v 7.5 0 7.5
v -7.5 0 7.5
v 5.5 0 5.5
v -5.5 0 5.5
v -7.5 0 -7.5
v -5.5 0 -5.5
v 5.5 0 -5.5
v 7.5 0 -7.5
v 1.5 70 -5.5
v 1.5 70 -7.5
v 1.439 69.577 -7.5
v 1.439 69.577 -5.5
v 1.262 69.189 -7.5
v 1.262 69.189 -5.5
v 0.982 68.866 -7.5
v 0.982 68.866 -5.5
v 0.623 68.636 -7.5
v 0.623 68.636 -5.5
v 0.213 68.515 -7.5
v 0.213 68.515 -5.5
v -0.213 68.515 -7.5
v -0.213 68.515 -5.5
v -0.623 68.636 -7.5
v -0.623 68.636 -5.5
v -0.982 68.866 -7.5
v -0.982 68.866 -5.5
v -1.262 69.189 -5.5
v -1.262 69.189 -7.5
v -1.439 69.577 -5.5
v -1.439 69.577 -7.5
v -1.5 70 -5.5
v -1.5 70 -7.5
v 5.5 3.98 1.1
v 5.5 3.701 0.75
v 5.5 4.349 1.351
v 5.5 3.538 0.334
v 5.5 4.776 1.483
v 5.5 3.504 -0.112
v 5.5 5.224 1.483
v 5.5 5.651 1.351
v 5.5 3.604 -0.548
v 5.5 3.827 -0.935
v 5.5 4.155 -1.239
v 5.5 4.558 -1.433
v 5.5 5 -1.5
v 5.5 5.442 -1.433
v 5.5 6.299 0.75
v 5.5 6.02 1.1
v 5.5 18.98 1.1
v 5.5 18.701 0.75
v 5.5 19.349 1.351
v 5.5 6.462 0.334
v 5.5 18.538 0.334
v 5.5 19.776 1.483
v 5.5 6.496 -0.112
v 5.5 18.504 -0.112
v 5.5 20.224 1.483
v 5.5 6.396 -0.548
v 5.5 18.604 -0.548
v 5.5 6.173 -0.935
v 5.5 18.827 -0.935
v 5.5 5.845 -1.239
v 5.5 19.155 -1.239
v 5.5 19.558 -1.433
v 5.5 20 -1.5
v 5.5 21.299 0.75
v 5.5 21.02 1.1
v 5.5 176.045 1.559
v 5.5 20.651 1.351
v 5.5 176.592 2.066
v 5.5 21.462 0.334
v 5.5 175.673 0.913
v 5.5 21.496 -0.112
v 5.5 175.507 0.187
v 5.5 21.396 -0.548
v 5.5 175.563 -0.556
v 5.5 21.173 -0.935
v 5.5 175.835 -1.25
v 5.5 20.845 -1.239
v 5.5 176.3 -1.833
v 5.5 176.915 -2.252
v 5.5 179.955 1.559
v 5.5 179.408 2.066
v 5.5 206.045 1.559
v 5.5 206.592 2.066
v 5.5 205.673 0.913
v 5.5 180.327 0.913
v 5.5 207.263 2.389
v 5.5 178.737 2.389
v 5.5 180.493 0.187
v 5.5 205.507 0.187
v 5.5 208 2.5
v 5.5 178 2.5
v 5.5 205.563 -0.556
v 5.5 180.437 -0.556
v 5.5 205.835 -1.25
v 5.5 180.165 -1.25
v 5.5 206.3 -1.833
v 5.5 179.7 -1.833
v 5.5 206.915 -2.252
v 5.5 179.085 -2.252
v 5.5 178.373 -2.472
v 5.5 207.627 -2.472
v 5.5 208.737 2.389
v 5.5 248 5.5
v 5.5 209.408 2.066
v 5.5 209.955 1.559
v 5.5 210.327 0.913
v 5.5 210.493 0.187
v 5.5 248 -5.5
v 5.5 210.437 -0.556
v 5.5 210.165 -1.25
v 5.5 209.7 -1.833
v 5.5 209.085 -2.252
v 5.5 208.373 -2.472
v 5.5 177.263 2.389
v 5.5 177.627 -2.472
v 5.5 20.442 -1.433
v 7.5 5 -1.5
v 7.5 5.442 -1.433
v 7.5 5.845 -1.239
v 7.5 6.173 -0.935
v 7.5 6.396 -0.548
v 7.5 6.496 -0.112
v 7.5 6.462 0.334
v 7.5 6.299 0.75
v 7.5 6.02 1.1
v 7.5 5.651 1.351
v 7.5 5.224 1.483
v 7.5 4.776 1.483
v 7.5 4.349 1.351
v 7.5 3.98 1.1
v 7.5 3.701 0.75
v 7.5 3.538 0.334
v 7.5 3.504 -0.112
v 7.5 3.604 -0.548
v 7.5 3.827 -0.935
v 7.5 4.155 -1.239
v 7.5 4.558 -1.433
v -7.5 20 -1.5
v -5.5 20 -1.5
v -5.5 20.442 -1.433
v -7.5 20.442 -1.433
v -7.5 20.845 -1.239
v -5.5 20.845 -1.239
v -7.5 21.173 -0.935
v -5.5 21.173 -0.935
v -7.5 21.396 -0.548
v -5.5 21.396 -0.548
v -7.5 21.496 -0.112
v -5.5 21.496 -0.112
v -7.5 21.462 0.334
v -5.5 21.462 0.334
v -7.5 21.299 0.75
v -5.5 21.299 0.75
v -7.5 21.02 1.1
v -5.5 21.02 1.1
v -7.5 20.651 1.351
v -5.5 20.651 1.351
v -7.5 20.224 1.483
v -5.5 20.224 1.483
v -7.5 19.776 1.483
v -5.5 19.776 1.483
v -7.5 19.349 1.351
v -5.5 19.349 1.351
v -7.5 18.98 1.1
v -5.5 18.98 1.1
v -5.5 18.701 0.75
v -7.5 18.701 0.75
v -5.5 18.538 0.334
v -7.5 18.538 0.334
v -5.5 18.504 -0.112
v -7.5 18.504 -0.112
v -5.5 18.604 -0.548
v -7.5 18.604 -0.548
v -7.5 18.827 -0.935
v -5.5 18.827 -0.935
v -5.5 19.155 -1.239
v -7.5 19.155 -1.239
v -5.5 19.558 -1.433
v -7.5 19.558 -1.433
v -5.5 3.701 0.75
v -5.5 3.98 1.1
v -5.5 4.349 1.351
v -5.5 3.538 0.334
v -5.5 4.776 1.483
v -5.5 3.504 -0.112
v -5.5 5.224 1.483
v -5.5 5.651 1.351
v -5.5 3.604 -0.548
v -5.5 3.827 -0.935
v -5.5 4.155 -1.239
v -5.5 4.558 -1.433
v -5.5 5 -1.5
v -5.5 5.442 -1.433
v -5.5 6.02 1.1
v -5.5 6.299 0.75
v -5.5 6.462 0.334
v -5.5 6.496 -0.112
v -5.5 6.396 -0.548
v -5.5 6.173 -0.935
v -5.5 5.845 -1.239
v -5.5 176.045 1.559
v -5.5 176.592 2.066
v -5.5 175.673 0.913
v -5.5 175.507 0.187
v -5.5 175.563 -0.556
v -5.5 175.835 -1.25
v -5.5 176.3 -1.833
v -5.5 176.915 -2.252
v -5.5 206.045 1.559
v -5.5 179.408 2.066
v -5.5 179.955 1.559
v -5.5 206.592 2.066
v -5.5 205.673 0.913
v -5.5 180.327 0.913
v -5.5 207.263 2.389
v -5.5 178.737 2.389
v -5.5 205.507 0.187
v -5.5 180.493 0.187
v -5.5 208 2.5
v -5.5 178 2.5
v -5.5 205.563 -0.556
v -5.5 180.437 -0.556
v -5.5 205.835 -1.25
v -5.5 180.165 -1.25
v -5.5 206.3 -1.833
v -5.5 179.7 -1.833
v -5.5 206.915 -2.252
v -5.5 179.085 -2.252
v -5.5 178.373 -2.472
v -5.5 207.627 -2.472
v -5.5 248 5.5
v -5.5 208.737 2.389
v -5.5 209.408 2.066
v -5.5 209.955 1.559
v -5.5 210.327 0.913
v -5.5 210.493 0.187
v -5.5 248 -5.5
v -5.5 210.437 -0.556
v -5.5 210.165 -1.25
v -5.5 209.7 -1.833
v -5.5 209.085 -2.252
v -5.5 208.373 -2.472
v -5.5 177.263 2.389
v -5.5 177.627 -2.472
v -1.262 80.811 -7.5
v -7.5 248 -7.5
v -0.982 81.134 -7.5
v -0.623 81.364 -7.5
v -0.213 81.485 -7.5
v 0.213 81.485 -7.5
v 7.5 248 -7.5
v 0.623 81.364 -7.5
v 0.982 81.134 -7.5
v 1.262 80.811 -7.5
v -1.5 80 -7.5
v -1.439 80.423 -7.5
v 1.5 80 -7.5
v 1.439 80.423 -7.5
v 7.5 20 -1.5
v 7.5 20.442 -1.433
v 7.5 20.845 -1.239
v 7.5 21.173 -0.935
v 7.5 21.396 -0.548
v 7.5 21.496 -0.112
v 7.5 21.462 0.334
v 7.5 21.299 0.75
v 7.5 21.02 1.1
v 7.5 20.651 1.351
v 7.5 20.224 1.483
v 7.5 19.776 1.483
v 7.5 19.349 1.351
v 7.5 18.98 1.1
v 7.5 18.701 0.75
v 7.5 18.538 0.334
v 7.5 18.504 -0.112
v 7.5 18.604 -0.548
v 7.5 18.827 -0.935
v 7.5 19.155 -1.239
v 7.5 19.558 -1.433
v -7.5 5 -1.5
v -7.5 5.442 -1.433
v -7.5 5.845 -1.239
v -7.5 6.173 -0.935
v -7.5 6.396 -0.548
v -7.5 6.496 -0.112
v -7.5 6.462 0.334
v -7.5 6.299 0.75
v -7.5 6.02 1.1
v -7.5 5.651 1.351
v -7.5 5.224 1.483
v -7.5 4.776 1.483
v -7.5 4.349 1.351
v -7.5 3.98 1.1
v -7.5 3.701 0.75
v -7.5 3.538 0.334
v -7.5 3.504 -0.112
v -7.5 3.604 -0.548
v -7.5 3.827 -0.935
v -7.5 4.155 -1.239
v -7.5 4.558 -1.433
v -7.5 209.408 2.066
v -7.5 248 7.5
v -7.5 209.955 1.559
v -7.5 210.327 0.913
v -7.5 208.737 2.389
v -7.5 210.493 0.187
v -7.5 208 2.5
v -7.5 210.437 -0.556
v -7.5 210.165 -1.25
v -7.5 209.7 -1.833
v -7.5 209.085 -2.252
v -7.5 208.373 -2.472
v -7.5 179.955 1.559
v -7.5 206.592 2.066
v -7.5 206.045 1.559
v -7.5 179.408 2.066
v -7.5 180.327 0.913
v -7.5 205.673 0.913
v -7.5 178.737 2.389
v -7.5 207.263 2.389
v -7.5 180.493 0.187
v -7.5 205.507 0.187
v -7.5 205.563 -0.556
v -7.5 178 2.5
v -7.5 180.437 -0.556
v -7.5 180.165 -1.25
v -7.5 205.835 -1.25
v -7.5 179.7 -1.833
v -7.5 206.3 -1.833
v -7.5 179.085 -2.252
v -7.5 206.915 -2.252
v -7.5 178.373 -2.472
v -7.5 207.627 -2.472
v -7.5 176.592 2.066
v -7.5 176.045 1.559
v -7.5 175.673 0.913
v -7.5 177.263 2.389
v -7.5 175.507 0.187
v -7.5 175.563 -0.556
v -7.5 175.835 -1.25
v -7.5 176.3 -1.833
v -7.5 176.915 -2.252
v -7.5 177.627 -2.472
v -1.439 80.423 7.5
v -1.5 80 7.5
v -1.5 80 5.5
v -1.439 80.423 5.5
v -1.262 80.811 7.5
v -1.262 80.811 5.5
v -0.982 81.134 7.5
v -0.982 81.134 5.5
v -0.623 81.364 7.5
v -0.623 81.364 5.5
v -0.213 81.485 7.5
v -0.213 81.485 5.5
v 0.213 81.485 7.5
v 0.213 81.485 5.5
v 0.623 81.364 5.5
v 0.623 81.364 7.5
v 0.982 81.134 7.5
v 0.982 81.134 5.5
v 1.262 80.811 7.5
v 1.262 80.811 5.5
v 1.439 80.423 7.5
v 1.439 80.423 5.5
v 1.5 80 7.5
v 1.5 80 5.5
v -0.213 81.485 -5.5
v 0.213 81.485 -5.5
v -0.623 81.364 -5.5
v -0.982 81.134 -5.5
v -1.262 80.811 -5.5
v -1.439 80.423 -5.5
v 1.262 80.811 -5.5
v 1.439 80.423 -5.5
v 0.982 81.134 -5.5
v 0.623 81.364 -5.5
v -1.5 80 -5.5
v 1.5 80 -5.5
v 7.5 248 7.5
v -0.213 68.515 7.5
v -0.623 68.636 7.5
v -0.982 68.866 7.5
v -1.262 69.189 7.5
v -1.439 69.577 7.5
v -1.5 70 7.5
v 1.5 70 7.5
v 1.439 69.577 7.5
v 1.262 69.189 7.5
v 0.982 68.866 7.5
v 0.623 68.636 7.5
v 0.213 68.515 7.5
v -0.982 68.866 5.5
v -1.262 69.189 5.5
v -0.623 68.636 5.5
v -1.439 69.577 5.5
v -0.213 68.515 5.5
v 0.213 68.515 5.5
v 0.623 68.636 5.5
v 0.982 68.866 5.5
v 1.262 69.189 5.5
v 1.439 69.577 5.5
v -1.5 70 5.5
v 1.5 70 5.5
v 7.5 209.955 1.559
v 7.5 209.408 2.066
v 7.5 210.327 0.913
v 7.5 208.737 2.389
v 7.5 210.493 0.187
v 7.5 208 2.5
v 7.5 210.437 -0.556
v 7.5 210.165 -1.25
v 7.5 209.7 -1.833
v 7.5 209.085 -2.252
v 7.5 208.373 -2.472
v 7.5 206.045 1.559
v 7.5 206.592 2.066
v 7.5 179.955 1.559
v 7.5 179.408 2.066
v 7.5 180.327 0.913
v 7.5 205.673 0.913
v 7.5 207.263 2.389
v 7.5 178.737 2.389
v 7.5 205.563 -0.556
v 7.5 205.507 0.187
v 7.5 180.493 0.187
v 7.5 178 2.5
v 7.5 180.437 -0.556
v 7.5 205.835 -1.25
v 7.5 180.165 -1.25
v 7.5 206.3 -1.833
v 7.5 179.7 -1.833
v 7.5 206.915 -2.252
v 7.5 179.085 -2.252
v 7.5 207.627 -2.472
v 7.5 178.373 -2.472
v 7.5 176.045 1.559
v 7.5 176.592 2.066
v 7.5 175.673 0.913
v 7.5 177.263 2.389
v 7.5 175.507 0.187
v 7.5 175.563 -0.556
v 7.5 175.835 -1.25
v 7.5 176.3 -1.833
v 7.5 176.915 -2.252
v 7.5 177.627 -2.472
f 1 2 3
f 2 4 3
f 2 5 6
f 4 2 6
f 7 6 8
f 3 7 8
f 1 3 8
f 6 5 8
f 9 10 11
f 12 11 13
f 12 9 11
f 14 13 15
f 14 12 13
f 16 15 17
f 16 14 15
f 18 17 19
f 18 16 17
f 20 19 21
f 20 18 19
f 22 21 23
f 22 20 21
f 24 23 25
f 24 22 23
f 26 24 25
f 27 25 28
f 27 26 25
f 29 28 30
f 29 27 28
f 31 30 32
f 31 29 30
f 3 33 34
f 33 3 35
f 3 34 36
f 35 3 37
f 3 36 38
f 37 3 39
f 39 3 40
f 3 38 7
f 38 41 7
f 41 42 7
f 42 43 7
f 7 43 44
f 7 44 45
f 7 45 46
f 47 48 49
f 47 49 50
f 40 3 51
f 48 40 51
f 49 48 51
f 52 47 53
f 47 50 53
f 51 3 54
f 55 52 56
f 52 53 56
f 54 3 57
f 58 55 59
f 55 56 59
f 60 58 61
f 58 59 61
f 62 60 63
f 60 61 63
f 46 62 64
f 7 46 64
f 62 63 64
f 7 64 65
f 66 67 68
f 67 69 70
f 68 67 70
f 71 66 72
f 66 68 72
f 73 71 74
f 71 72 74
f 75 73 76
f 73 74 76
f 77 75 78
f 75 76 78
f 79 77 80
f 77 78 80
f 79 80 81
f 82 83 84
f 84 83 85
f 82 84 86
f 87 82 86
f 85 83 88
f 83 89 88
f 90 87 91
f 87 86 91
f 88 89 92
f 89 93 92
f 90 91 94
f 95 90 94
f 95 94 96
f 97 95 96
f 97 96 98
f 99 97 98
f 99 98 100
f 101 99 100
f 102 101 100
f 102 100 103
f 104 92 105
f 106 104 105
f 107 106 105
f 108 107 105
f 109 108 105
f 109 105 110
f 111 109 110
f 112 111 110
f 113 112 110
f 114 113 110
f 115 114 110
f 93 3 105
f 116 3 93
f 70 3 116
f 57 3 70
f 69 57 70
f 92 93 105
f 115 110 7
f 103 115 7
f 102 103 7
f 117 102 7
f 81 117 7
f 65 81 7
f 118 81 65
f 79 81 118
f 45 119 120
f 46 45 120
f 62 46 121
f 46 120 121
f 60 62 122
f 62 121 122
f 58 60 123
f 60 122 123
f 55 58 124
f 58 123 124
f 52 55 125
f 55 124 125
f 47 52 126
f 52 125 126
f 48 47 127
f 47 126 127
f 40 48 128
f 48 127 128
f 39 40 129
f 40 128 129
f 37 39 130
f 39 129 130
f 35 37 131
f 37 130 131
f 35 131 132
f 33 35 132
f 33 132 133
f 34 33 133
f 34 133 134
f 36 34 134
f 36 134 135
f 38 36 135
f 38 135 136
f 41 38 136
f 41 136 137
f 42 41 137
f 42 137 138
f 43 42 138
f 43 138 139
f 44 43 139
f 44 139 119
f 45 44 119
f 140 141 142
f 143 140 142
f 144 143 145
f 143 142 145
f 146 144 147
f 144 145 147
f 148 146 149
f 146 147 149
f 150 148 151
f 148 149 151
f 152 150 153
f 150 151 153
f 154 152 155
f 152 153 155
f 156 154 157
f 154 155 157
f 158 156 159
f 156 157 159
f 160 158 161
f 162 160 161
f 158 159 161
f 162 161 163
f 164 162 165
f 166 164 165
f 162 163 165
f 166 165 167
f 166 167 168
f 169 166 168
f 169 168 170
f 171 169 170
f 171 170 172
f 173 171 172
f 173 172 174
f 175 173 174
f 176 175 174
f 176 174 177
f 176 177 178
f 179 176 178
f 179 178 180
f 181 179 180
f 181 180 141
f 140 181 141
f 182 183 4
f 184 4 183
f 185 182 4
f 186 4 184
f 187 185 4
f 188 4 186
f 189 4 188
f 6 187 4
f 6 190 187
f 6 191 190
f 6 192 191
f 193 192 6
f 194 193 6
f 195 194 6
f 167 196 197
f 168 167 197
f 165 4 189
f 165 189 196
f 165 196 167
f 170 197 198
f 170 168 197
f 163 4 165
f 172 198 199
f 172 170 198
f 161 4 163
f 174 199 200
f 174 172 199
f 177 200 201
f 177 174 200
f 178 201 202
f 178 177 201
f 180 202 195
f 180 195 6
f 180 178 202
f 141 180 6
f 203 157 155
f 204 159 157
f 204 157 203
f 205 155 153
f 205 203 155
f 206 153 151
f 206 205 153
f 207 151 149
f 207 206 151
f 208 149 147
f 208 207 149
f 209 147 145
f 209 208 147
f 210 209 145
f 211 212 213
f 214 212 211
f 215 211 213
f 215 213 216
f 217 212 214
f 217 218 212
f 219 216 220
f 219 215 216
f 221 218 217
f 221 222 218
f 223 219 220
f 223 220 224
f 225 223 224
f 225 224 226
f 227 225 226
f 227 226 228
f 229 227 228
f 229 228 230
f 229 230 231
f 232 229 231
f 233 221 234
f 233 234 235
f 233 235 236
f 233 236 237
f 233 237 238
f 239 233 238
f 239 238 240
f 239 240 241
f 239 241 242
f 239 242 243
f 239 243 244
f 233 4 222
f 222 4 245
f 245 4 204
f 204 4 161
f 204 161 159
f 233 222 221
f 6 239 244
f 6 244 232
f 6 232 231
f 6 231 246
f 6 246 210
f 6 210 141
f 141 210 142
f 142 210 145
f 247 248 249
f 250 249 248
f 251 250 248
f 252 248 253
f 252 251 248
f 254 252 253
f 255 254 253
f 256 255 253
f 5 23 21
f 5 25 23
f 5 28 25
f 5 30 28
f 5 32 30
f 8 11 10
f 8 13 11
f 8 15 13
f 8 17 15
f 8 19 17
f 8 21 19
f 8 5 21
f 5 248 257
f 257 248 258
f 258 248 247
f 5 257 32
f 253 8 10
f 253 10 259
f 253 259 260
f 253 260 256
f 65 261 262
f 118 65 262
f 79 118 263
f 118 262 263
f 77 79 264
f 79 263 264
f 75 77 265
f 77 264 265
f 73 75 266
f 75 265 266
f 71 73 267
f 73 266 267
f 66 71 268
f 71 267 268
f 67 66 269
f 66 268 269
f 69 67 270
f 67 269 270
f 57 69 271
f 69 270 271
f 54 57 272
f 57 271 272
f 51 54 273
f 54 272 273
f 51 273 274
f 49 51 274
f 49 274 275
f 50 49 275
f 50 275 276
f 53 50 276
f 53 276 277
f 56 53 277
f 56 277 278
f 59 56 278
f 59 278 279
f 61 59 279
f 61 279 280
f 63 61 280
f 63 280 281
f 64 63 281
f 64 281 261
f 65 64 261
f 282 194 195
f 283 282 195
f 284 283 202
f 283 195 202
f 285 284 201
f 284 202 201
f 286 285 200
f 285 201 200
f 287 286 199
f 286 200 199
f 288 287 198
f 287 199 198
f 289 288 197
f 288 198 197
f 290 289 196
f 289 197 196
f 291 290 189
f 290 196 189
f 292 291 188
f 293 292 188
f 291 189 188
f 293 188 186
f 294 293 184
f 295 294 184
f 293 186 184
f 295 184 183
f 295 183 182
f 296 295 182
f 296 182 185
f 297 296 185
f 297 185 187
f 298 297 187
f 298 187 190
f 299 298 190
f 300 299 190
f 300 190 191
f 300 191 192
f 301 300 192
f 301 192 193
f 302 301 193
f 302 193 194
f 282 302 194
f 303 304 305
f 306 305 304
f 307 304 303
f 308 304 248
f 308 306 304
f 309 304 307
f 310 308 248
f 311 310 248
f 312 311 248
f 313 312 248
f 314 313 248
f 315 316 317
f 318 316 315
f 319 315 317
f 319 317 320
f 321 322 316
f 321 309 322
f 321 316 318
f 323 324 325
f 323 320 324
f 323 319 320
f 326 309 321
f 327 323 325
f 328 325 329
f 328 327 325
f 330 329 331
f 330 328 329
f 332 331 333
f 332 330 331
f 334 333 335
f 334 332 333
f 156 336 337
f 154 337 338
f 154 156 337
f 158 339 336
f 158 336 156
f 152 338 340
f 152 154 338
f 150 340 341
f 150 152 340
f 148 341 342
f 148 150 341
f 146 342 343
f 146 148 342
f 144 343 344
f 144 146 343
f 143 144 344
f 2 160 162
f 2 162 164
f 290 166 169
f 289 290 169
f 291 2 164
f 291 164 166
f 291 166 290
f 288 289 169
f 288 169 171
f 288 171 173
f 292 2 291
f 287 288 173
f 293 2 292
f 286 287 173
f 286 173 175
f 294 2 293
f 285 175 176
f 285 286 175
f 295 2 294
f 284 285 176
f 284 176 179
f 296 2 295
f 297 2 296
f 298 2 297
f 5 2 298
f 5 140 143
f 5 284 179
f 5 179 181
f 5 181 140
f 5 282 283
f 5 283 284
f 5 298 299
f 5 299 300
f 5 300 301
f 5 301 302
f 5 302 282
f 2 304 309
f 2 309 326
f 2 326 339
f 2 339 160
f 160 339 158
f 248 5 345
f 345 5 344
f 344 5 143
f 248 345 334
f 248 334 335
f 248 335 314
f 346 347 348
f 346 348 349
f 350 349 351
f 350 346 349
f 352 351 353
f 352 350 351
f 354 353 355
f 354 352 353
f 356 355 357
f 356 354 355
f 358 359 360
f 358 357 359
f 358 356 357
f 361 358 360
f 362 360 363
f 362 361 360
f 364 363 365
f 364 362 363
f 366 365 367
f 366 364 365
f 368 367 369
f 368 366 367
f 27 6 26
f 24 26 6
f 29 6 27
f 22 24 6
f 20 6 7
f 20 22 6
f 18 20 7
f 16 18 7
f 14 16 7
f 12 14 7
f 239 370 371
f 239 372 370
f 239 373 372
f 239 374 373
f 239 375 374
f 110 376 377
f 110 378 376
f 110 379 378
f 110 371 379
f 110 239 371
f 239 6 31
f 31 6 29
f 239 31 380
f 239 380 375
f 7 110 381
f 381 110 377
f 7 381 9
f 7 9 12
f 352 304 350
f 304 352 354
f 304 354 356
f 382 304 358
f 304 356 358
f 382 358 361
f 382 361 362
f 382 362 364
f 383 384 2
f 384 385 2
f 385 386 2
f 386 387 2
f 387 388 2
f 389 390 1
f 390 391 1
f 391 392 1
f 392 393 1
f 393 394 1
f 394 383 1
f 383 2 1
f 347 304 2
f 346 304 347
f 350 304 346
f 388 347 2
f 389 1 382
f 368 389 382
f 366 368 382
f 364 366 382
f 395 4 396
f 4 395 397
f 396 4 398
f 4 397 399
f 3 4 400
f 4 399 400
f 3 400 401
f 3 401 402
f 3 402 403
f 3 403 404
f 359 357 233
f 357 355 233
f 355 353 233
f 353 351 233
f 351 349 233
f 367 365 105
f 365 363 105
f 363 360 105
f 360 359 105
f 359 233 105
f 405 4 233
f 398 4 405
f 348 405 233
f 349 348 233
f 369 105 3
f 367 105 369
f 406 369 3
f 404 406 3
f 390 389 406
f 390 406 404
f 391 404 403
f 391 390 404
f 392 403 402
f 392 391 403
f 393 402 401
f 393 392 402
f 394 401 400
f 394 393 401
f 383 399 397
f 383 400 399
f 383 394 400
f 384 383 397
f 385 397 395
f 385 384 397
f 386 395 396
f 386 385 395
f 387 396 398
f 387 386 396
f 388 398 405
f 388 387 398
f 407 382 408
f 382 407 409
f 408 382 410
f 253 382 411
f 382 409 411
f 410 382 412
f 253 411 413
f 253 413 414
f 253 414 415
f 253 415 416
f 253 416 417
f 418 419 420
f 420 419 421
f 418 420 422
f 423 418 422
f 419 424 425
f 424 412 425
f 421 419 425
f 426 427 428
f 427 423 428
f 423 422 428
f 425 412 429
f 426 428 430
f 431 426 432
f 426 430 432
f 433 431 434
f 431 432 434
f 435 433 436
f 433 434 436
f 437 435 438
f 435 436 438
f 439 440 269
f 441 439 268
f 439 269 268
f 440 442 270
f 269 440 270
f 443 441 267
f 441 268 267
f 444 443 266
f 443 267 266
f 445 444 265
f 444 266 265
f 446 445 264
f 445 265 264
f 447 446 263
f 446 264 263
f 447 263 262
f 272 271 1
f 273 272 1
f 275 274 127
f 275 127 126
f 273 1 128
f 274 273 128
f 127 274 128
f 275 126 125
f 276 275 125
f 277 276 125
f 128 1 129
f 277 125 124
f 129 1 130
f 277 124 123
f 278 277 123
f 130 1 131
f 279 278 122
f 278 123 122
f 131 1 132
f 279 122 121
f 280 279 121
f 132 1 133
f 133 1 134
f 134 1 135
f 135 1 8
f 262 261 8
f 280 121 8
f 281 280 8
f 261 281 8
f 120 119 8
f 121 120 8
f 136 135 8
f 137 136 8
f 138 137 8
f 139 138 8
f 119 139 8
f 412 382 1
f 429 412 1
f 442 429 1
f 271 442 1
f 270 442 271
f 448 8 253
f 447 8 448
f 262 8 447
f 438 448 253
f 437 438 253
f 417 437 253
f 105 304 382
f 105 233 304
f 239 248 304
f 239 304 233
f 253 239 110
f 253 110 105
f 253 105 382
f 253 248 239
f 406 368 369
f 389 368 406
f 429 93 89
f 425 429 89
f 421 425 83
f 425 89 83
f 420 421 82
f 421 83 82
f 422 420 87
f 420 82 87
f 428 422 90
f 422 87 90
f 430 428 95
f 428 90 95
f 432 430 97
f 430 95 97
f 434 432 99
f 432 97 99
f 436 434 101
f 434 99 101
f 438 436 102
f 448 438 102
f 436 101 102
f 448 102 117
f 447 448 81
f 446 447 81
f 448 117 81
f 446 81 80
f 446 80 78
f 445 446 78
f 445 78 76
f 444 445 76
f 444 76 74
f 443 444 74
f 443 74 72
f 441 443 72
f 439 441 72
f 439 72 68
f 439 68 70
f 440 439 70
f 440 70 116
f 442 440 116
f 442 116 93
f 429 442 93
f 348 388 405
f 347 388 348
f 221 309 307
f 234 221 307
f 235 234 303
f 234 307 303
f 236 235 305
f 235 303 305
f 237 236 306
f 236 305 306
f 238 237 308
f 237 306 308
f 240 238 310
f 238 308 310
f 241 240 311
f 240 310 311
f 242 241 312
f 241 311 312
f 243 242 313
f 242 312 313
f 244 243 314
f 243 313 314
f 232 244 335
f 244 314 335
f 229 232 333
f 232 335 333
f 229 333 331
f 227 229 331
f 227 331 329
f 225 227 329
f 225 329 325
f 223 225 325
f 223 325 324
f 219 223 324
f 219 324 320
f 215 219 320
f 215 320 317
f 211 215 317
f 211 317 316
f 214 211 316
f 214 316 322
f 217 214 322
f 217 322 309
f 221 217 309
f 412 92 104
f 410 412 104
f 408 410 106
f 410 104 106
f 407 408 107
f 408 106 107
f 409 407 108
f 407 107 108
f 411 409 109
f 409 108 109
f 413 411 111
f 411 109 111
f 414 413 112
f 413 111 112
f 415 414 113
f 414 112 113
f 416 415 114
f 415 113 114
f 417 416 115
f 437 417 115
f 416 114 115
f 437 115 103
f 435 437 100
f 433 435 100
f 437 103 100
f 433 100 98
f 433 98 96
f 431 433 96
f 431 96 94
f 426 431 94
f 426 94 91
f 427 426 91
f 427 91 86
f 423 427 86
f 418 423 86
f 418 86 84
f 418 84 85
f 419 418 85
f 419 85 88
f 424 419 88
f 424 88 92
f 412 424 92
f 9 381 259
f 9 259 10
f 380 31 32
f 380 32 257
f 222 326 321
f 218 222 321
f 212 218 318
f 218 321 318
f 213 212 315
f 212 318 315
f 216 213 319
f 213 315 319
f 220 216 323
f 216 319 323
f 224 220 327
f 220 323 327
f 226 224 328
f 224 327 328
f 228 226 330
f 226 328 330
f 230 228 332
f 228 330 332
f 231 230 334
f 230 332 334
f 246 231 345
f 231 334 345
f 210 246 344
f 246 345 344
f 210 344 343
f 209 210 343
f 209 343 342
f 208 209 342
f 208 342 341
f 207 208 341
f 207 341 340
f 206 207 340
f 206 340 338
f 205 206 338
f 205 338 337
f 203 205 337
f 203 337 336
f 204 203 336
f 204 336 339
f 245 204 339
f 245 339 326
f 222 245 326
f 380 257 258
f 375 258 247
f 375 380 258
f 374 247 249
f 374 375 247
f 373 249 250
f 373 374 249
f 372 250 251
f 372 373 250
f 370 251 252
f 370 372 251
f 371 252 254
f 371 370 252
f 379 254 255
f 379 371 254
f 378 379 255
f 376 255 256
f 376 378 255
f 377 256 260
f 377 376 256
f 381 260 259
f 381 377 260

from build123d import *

# Parameters (mm, degrees)
SKETCH_1_W          = 15
SKETCH_1_H          = 15
EXTRUDE_1_DEPTH     = 248
SKETCH_3_R          = 1.5
CUT_EXTRUDE_2_DEPTH = 15
CUT_EXTRUDE_3_DEPTH = 15
SKETCH_5_W          = 11
SKETCH_5_H          = 11
CUT_EXTRUDE_4_DEPTH = 248
SKETCH_6_R          = 2.5
CUT_EXTRUDE_5_DEPTH = 15


with BuildPart() as part:
    # 草图1 → 凸台-拉伸1 (new body)
    with BuildSketch(Plane(origin=(0, 0, 0), x_dir=(1, 0, 0), z_dir=(0, 1, 0))):
        Rectangle(SKETCH_1_W, SKETCH_1_H)
    extrude(amount=EXTRUDE_1_DEPTH)

    # 草图3 → 切除-拉伸2 (cut)
    with BuildSketch(Plane(origin=(7.5, 0, 0), x_dir=(0, 0, -1), z_dir=(1, 0, 0))):
        with Locations((0, 5)):
            Circle(SKETCH_3_R)
        with Locations((0, 20)):
            Circle(SKETCH_3_R)
    extrude(amount=-CUT_EXTRUDE_2_DEPTH, mode=Mode.SUBTRACT)

    # 草图4 → 切除-拉伸3 (cut)
    with BuildSketch(Plane.XY.offset(7.5)):
        with BuildLine():
            Line((-1.5, 70), (-1.5, 80))
            ThreePointArc((-1.5, 80), (0, 81.5), (1.5, 80))
            Line((1.5, 80), (1.5, 70))
            ThreePointArc((1.5, 70), (0, 68.5), (-1.5, 70))
        make_face()
    extrude(amount=-CUT_EXTRUDE_3_DEPTH, mode=Mode.SUBTRACT)

    # 草图5 → 切除-拉伸4 (cut)
    with BuildSketch(Plane(origin=(0, 248, 0), x_dir=(1, 0, 0), z_dir=(0, 1, 0))):
        Rectangle(SKETCH_5_W, SKETCH_5_H)
    extrude(amount=-CUT_EXTRUDE_4_DEPTH, mode=Mode.SUBTRACT)

    # 草图6 → 切除-拉伸5 (cut)
    with BuildSketch(Plane.ZY.offset(7.5)):
        with Locations((0, 208)):
            Circle(SKETCH_6_R)
        with Locations((0, 178)):
            Circle(SKETCH_6_R)
    extrude(amount=-CUT_EXTRUDE_5_DEPTH, mode=Mode.SUBTRACT)


solid = part.part
